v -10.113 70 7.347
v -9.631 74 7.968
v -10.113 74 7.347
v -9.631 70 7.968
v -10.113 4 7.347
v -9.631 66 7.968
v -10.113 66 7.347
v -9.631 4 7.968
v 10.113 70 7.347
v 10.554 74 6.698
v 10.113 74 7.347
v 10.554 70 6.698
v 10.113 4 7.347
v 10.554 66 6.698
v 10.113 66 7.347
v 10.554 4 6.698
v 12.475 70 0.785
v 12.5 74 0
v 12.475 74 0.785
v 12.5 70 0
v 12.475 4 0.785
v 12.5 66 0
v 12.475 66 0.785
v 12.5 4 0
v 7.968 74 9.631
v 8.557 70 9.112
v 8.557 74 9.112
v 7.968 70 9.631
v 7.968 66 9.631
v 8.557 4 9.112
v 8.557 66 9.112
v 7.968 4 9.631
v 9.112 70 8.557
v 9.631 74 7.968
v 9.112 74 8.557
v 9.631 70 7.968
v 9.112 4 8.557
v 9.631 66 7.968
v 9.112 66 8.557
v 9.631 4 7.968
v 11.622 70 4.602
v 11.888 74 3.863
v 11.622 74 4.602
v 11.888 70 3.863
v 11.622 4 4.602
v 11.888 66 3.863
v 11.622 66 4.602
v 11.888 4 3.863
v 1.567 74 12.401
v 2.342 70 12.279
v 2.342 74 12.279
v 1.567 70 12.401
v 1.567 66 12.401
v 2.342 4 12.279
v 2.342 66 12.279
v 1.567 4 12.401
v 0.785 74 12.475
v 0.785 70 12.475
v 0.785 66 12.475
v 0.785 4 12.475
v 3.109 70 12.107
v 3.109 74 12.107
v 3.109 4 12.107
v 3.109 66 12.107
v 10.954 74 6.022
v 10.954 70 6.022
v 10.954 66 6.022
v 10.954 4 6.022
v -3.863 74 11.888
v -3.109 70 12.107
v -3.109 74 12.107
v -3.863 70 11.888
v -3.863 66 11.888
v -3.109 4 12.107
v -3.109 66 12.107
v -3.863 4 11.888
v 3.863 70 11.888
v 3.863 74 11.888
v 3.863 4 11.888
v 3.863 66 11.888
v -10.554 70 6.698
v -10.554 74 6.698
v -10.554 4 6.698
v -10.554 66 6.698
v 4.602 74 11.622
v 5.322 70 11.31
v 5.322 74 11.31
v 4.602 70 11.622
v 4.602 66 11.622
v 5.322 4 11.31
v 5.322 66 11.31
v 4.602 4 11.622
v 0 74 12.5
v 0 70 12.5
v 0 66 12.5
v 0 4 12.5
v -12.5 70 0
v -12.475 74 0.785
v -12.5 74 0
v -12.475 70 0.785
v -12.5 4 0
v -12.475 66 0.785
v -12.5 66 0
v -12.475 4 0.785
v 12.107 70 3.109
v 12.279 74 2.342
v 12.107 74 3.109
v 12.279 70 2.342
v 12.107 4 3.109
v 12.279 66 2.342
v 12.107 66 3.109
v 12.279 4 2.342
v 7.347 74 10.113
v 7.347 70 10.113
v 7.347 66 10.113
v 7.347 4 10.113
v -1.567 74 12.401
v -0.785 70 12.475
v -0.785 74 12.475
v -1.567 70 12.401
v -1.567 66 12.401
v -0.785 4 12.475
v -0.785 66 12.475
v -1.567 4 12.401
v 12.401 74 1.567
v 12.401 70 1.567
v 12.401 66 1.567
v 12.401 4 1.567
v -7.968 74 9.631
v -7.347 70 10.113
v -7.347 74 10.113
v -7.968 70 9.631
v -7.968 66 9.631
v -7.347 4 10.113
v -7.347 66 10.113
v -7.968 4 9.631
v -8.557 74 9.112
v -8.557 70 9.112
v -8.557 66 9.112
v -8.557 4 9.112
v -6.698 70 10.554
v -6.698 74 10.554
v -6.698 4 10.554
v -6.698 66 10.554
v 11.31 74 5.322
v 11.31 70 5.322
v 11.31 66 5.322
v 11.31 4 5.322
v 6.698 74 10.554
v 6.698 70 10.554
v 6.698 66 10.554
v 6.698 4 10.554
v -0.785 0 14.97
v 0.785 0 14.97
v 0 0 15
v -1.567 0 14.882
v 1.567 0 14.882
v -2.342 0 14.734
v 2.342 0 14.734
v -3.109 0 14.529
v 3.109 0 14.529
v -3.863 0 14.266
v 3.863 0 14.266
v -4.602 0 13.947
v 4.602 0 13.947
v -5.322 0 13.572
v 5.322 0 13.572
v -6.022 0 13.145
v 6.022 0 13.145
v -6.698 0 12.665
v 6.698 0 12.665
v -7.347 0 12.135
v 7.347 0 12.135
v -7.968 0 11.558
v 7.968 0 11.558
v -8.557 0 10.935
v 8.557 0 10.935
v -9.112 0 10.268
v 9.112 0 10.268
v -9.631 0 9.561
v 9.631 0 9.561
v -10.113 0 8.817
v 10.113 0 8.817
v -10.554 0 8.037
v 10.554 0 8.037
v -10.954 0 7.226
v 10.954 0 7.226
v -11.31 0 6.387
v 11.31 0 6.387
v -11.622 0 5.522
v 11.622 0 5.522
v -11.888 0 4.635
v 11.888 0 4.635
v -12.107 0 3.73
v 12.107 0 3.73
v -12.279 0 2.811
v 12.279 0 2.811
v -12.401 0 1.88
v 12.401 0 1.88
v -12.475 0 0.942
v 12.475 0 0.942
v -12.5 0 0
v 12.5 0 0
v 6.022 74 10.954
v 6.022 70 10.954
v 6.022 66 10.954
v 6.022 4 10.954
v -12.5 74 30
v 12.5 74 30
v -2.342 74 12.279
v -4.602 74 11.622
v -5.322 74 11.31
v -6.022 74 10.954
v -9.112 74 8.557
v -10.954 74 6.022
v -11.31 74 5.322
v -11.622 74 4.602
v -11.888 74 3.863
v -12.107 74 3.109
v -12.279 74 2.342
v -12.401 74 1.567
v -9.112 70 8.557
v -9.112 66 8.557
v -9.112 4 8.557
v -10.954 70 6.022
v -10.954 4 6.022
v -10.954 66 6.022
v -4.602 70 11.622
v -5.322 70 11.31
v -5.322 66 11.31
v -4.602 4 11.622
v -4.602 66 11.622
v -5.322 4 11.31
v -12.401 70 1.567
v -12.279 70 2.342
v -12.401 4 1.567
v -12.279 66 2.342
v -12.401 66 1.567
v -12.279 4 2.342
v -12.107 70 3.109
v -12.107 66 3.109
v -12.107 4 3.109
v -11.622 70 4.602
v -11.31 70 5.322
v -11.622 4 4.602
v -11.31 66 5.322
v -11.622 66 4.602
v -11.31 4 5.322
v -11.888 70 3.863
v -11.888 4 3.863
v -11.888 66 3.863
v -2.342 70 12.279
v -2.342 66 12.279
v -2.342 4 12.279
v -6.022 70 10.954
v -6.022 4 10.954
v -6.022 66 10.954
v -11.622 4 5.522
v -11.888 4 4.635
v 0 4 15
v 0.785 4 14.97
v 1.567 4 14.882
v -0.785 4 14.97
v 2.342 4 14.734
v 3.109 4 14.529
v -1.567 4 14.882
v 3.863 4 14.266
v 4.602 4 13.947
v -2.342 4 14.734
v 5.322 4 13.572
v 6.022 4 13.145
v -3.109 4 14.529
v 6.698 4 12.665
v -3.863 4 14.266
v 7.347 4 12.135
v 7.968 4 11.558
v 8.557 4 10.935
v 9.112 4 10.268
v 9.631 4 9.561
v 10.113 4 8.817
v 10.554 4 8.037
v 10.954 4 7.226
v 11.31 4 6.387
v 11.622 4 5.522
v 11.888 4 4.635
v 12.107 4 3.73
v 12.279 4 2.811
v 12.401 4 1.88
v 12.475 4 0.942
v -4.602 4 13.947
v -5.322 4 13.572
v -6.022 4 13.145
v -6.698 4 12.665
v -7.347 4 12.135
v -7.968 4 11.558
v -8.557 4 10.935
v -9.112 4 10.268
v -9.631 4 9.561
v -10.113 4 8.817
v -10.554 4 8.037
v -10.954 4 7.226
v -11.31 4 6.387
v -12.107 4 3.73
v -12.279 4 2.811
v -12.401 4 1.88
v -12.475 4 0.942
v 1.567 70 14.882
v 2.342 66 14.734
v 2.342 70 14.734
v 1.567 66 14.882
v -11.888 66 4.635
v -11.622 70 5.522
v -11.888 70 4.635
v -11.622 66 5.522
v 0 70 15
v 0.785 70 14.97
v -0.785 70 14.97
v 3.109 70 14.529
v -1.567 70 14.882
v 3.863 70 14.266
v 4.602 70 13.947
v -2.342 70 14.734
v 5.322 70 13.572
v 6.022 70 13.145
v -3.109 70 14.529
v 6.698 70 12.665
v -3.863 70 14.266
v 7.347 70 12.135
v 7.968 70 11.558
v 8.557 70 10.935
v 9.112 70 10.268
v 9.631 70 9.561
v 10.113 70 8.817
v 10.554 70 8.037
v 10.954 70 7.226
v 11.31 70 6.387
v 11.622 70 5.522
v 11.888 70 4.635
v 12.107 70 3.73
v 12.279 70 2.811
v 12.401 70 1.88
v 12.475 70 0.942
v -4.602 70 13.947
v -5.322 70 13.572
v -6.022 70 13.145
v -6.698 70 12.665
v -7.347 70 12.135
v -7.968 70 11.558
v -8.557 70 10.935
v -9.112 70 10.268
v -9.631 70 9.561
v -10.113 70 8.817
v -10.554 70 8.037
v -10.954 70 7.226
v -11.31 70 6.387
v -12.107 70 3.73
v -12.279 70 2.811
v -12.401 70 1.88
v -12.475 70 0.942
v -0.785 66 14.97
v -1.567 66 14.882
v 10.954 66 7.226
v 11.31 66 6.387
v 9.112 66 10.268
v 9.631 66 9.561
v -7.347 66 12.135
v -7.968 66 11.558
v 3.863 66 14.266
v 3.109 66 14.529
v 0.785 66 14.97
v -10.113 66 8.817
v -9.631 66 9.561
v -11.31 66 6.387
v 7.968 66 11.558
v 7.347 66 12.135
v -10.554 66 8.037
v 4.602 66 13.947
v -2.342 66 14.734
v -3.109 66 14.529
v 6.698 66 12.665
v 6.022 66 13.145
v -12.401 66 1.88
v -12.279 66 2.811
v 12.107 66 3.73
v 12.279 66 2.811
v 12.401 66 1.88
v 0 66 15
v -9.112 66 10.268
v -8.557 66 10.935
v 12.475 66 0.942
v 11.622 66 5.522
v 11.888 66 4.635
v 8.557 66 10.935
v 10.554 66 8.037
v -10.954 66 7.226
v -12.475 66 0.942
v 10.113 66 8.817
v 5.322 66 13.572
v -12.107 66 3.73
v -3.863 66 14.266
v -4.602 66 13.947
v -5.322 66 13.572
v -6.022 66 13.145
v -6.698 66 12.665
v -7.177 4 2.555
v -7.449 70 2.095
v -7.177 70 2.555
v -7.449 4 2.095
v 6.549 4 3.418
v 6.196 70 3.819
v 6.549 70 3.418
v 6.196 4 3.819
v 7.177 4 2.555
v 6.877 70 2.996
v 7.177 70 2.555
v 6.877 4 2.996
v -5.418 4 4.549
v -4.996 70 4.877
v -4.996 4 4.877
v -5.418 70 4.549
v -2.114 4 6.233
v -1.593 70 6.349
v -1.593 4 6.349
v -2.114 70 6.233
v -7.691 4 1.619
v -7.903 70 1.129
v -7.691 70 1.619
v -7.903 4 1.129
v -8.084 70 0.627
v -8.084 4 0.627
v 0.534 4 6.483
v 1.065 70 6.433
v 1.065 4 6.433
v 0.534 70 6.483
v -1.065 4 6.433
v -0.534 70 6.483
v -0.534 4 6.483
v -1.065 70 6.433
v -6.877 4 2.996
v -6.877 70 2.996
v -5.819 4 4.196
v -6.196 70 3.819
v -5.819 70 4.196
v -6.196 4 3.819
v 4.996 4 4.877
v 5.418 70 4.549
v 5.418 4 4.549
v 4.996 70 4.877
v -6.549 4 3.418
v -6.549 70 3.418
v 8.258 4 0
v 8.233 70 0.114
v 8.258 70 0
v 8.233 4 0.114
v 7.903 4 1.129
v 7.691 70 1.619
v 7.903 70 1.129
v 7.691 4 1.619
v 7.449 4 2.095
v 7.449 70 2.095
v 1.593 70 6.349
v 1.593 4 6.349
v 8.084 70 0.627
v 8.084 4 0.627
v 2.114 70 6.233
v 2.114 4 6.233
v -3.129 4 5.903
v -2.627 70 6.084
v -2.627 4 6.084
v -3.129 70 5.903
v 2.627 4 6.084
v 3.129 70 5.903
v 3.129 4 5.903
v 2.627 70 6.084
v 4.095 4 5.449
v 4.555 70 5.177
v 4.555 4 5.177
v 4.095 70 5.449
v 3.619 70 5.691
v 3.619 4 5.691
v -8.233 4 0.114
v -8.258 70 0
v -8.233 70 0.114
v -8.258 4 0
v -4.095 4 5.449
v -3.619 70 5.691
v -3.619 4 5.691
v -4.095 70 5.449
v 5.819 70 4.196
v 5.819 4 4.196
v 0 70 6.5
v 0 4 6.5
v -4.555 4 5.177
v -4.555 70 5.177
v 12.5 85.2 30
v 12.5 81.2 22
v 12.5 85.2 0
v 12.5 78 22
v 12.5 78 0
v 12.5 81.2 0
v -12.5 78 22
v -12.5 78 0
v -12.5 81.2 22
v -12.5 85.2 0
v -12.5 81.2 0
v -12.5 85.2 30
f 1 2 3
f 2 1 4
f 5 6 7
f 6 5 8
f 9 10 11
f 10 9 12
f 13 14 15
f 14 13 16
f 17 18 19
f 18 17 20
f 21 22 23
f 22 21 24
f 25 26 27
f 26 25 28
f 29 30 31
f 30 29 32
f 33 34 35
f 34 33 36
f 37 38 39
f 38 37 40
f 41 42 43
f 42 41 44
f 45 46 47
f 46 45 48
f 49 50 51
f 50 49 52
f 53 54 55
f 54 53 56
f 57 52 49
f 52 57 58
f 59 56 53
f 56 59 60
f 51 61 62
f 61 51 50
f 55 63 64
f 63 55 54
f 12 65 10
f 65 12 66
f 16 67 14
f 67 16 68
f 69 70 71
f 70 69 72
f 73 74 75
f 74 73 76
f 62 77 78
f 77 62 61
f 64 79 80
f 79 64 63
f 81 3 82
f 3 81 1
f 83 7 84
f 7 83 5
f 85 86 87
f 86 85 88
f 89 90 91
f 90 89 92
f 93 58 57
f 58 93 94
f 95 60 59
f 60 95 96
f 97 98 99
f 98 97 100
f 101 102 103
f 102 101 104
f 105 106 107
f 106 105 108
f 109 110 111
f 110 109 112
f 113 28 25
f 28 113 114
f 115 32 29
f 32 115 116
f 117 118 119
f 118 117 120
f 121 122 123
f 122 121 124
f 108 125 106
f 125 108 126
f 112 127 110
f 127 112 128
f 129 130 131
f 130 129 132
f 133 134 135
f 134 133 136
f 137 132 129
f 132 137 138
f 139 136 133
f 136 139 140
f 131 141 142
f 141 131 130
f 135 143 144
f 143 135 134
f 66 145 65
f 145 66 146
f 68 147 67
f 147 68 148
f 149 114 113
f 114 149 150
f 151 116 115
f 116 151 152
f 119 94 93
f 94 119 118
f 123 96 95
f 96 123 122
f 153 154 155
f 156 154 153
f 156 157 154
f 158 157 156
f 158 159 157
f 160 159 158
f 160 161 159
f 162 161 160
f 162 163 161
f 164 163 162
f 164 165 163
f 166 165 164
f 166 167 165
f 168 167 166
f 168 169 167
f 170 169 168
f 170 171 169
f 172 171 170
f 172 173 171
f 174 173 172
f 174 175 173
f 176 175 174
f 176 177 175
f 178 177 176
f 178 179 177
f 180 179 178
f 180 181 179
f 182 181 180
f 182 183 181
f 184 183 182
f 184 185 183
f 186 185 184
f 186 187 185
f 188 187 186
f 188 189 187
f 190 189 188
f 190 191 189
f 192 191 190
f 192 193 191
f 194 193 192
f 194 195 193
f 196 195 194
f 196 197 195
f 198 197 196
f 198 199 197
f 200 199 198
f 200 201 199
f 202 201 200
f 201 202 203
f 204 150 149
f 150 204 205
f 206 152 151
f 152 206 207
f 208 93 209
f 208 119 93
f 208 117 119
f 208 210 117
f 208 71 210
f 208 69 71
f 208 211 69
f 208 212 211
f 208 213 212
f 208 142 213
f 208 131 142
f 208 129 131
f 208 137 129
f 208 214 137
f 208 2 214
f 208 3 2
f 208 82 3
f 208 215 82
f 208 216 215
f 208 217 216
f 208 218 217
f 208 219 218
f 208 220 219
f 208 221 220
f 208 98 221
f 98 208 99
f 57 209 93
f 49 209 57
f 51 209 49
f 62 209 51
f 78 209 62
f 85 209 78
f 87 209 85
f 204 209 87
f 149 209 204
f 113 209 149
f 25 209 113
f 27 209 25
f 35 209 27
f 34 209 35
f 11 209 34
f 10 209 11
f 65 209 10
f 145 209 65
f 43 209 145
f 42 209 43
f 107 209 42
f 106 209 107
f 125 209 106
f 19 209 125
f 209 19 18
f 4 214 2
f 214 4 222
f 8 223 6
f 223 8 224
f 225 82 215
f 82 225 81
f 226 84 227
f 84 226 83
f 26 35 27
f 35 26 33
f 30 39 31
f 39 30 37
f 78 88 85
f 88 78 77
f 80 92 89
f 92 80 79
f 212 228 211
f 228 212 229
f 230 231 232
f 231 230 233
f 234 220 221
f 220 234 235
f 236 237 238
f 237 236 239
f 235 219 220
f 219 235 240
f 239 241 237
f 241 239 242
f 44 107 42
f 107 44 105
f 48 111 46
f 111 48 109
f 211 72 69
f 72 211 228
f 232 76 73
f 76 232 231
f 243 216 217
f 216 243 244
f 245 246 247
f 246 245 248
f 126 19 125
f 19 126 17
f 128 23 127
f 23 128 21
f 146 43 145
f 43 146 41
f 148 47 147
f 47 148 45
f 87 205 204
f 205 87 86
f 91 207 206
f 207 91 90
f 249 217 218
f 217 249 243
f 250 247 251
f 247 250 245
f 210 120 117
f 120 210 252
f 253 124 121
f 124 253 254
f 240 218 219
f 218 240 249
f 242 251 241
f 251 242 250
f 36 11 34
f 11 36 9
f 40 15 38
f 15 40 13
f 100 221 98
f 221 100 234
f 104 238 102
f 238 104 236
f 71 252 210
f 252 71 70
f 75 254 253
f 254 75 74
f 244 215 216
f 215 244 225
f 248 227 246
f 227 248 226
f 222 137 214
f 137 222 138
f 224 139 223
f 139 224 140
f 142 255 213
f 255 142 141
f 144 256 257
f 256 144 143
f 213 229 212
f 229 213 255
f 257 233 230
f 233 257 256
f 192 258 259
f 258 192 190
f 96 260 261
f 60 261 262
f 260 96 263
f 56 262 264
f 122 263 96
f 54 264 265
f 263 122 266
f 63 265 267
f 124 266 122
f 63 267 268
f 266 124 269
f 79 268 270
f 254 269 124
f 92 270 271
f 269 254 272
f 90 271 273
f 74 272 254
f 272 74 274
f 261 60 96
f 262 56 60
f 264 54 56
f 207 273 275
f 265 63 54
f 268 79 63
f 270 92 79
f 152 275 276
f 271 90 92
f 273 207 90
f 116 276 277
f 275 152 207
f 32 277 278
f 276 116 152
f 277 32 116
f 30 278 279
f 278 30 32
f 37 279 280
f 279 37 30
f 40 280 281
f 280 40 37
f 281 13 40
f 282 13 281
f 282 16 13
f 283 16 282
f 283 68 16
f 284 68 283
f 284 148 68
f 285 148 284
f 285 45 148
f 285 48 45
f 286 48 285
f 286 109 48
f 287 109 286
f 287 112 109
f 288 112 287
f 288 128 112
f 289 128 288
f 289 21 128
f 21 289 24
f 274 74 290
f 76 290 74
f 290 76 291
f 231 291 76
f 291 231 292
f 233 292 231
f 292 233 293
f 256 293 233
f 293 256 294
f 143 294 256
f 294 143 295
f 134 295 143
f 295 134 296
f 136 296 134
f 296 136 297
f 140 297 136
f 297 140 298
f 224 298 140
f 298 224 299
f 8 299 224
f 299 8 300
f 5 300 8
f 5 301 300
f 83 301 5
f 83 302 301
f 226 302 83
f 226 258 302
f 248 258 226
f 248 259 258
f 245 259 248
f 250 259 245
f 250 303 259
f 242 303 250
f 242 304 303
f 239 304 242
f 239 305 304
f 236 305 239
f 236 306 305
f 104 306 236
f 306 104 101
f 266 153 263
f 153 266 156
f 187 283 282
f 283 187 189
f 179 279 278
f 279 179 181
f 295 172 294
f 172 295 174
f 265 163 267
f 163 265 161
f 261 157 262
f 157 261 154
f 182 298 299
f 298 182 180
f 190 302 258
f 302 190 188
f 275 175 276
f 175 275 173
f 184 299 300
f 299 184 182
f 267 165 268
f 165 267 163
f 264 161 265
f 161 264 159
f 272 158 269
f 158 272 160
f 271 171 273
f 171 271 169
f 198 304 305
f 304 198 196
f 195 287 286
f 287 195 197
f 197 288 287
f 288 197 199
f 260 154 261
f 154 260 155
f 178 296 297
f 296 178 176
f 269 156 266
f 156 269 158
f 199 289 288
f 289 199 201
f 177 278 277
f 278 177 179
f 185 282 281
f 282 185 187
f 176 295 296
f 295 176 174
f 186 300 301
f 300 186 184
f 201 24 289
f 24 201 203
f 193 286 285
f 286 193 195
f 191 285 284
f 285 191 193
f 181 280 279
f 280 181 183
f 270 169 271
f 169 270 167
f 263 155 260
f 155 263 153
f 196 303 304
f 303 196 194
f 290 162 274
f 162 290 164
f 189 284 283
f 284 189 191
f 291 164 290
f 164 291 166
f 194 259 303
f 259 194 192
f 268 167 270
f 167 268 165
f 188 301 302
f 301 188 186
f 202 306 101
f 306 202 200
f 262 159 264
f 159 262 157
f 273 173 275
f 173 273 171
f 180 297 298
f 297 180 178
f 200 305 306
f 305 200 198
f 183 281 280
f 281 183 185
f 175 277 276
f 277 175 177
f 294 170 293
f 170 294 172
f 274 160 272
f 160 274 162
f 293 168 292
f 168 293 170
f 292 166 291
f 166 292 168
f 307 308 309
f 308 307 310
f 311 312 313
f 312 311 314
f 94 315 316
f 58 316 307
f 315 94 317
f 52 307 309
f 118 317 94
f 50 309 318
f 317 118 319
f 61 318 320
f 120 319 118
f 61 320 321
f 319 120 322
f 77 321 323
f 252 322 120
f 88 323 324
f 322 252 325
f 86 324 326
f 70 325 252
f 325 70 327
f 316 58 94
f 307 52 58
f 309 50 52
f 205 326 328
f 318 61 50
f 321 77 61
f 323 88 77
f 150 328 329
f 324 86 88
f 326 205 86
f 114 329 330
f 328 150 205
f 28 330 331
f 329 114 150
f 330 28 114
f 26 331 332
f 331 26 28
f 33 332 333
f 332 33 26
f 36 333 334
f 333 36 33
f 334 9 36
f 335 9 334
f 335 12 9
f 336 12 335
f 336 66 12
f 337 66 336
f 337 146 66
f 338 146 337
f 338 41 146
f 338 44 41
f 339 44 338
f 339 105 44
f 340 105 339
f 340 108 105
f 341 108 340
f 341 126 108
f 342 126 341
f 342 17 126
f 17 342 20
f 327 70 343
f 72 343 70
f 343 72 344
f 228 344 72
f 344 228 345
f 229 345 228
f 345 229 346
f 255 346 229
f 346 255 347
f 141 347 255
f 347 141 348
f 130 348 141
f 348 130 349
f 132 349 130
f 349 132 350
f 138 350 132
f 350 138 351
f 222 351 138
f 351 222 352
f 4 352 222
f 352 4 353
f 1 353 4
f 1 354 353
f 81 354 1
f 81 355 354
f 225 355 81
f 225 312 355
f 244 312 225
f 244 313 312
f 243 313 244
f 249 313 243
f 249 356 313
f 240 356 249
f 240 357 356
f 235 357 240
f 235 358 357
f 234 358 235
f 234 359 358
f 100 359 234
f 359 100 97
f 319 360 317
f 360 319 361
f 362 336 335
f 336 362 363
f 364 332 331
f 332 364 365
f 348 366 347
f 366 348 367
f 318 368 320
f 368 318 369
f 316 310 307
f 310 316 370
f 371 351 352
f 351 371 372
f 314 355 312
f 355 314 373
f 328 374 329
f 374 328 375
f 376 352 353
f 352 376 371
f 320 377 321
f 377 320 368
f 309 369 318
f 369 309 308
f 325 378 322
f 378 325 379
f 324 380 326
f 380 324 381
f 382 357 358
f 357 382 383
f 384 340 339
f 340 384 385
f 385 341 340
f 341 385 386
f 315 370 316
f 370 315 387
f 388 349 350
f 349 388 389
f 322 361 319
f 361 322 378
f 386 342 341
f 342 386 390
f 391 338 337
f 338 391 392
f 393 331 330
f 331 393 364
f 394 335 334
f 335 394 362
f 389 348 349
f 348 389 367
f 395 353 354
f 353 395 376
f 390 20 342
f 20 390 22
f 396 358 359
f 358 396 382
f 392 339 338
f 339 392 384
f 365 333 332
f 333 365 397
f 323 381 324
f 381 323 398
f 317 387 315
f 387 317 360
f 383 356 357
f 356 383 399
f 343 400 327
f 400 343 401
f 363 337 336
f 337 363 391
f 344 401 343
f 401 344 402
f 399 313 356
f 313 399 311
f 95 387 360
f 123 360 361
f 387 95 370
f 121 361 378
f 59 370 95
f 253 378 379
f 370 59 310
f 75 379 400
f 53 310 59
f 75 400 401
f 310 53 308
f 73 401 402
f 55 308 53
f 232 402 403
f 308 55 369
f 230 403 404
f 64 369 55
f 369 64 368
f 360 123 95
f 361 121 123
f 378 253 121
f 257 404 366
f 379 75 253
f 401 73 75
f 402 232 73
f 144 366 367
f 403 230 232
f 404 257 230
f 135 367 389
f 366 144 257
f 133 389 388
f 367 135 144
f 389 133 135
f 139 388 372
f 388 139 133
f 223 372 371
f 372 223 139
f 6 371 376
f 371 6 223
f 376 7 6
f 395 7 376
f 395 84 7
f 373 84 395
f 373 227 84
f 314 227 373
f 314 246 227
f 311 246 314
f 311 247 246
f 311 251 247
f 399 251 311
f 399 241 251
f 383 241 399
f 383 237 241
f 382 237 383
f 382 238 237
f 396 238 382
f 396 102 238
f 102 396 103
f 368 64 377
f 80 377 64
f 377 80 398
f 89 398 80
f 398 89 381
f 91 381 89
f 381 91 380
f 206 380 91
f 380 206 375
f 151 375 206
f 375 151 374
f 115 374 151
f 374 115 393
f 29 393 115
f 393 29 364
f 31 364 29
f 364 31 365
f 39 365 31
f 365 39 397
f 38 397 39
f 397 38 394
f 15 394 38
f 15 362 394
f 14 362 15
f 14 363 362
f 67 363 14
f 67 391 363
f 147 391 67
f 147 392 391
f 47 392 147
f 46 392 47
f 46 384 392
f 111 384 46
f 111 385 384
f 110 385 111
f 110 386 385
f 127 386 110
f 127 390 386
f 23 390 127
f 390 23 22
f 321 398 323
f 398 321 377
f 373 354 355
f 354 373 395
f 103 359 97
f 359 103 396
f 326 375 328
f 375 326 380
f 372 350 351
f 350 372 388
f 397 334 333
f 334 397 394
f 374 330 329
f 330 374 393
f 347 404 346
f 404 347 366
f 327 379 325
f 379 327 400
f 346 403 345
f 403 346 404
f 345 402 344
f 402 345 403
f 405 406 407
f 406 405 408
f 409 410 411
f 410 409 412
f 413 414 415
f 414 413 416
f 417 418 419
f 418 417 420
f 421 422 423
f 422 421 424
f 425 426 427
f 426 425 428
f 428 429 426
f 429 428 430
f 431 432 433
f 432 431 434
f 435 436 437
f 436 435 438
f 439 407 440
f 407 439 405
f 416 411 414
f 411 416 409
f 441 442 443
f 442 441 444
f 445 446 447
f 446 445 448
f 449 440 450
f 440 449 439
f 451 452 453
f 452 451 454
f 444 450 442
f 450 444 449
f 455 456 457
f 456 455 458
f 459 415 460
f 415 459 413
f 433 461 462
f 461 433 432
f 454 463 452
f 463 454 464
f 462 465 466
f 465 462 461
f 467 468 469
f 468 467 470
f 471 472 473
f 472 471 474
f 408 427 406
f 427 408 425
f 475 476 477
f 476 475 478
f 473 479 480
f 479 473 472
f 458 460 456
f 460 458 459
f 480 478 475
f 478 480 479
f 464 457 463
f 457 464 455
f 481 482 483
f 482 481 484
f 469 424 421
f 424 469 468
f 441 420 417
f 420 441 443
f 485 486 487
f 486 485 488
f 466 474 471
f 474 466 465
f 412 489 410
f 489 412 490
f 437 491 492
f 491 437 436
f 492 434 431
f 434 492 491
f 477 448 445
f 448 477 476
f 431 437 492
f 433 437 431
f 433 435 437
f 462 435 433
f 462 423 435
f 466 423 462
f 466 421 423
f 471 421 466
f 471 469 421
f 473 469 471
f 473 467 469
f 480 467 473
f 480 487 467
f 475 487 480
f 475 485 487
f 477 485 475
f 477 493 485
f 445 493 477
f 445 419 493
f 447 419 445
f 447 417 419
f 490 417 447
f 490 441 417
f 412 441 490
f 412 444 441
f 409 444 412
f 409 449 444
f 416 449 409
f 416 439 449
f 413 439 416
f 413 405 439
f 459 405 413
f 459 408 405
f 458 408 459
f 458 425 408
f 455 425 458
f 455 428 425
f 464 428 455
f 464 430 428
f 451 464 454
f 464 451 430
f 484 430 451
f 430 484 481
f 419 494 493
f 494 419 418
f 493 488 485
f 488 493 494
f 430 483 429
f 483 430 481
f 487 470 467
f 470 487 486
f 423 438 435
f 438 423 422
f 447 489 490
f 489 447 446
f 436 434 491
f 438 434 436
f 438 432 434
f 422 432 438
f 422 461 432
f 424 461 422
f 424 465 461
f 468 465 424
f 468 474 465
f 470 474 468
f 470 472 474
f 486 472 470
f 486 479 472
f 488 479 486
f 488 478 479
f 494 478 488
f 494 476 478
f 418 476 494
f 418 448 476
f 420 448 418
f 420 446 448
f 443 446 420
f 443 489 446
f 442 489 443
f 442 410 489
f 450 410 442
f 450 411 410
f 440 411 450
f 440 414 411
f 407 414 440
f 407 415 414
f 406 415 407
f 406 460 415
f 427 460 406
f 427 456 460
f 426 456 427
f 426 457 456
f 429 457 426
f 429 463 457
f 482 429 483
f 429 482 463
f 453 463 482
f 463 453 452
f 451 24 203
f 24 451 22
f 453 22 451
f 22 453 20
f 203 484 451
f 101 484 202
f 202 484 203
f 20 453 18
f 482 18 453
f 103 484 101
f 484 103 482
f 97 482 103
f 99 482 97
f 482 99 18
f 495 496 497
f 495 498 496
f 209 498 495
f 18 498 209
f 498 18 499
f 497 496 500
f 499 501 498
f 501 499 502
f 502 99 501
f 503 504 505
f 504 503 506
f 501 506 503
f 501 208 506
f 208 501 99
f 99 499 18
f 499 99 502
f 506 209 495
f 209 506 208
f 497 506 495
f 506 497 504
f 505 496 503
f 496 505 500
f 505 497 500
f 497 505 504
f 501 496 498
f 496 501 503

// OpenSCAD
/* [Parameters] */

// Holder Diameter
D = 25; 
// Holder Thickness
Th= 4;
// Spool Length
SL = 62; 
// Support Separation
SS = 3.2;
// Support Thickness
ST = 8;
// Support Height
SH = 30;
// Holder Length
HL = SL+3*Th;
// Edge Height
EH = 5;   //

/* [Hidden] */

sc = (EH+D)/(D);

module spoolHolder(){
union(){
	difference(){
		difference(){
			
			union(){	

					cylinder(h=HL,r=D/2,$fn=100, center = false);
					translate([-D/2,0,0]) cube(size = [D,D/4,HL]);
					translate([0,0,0]) scale([1, sc, 1]) 
						cylinder(h=Th,r=D/2,$fn=100);
					translate([0,0,SL+Th]) scale([1, sc, 1]) 
						cylinder(h=Th,r=D/2,$fn=100);
			}
			translate([0,Th/2,Th]) cylinder(h=HL-2*Th,r=D/2-Th,$fn=100);
		}
		translate([-1-D/2,0,-1]) cube(size = [D+2,D,HL + 2]);
	}

	translate([-D/2,-SH,HL]) cube([D,SH,Th]);	
	translate([-D/2,-SH,HL+Th+SS]) cube([D,SH,Th]);
	translate([-D/2,-SH,HL]) cube([D,ST,2*Th+SS]);
}
}

rotate([-90,0,0]) 
spoolHolder();
